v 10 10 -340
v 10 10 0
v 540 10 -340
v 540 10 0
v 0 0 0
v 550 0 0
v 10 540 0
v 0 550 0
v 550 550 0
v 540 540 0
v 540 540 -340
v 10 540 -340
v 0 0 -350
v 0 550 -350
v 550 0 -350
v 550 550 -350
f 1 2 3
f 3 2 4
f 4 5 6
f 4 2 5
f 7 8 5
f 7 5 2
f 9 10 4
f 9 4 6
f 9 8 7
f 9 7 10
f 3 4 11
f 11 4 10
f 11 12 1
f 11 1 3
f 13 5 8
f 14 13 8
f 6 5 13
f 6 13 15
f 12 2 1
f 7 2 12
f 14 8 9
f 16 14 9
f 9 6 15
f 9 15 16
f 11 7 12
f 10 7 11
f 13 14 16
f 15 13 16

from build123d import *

# Parameters (mm, degrees)
F0_W     = 550
F0_H     = 550
F1_DEPTH = 350
F2_W     = 530
F2_H     = 530
F3_DEPTH = 340


with BuildPart() as f1:
    # F0 (on Top) → F1 (new body)
    with BuildSketch(Plane.XY):
        with Locations((275, 275)):
            Rectangle(F0_W, F0_H)
    extrude(amount=-F1_DEPTH)

    # F2 (on Top) → F3 (cut)
    with BuildSketch(Plane.XY):
        with Locations((275, 275)):
            Rectangle(F2_W, F2_H)
    extrude(amount=-F3_DEPTH, mode=Mode.SUBTRACT)


solid = f1.part
